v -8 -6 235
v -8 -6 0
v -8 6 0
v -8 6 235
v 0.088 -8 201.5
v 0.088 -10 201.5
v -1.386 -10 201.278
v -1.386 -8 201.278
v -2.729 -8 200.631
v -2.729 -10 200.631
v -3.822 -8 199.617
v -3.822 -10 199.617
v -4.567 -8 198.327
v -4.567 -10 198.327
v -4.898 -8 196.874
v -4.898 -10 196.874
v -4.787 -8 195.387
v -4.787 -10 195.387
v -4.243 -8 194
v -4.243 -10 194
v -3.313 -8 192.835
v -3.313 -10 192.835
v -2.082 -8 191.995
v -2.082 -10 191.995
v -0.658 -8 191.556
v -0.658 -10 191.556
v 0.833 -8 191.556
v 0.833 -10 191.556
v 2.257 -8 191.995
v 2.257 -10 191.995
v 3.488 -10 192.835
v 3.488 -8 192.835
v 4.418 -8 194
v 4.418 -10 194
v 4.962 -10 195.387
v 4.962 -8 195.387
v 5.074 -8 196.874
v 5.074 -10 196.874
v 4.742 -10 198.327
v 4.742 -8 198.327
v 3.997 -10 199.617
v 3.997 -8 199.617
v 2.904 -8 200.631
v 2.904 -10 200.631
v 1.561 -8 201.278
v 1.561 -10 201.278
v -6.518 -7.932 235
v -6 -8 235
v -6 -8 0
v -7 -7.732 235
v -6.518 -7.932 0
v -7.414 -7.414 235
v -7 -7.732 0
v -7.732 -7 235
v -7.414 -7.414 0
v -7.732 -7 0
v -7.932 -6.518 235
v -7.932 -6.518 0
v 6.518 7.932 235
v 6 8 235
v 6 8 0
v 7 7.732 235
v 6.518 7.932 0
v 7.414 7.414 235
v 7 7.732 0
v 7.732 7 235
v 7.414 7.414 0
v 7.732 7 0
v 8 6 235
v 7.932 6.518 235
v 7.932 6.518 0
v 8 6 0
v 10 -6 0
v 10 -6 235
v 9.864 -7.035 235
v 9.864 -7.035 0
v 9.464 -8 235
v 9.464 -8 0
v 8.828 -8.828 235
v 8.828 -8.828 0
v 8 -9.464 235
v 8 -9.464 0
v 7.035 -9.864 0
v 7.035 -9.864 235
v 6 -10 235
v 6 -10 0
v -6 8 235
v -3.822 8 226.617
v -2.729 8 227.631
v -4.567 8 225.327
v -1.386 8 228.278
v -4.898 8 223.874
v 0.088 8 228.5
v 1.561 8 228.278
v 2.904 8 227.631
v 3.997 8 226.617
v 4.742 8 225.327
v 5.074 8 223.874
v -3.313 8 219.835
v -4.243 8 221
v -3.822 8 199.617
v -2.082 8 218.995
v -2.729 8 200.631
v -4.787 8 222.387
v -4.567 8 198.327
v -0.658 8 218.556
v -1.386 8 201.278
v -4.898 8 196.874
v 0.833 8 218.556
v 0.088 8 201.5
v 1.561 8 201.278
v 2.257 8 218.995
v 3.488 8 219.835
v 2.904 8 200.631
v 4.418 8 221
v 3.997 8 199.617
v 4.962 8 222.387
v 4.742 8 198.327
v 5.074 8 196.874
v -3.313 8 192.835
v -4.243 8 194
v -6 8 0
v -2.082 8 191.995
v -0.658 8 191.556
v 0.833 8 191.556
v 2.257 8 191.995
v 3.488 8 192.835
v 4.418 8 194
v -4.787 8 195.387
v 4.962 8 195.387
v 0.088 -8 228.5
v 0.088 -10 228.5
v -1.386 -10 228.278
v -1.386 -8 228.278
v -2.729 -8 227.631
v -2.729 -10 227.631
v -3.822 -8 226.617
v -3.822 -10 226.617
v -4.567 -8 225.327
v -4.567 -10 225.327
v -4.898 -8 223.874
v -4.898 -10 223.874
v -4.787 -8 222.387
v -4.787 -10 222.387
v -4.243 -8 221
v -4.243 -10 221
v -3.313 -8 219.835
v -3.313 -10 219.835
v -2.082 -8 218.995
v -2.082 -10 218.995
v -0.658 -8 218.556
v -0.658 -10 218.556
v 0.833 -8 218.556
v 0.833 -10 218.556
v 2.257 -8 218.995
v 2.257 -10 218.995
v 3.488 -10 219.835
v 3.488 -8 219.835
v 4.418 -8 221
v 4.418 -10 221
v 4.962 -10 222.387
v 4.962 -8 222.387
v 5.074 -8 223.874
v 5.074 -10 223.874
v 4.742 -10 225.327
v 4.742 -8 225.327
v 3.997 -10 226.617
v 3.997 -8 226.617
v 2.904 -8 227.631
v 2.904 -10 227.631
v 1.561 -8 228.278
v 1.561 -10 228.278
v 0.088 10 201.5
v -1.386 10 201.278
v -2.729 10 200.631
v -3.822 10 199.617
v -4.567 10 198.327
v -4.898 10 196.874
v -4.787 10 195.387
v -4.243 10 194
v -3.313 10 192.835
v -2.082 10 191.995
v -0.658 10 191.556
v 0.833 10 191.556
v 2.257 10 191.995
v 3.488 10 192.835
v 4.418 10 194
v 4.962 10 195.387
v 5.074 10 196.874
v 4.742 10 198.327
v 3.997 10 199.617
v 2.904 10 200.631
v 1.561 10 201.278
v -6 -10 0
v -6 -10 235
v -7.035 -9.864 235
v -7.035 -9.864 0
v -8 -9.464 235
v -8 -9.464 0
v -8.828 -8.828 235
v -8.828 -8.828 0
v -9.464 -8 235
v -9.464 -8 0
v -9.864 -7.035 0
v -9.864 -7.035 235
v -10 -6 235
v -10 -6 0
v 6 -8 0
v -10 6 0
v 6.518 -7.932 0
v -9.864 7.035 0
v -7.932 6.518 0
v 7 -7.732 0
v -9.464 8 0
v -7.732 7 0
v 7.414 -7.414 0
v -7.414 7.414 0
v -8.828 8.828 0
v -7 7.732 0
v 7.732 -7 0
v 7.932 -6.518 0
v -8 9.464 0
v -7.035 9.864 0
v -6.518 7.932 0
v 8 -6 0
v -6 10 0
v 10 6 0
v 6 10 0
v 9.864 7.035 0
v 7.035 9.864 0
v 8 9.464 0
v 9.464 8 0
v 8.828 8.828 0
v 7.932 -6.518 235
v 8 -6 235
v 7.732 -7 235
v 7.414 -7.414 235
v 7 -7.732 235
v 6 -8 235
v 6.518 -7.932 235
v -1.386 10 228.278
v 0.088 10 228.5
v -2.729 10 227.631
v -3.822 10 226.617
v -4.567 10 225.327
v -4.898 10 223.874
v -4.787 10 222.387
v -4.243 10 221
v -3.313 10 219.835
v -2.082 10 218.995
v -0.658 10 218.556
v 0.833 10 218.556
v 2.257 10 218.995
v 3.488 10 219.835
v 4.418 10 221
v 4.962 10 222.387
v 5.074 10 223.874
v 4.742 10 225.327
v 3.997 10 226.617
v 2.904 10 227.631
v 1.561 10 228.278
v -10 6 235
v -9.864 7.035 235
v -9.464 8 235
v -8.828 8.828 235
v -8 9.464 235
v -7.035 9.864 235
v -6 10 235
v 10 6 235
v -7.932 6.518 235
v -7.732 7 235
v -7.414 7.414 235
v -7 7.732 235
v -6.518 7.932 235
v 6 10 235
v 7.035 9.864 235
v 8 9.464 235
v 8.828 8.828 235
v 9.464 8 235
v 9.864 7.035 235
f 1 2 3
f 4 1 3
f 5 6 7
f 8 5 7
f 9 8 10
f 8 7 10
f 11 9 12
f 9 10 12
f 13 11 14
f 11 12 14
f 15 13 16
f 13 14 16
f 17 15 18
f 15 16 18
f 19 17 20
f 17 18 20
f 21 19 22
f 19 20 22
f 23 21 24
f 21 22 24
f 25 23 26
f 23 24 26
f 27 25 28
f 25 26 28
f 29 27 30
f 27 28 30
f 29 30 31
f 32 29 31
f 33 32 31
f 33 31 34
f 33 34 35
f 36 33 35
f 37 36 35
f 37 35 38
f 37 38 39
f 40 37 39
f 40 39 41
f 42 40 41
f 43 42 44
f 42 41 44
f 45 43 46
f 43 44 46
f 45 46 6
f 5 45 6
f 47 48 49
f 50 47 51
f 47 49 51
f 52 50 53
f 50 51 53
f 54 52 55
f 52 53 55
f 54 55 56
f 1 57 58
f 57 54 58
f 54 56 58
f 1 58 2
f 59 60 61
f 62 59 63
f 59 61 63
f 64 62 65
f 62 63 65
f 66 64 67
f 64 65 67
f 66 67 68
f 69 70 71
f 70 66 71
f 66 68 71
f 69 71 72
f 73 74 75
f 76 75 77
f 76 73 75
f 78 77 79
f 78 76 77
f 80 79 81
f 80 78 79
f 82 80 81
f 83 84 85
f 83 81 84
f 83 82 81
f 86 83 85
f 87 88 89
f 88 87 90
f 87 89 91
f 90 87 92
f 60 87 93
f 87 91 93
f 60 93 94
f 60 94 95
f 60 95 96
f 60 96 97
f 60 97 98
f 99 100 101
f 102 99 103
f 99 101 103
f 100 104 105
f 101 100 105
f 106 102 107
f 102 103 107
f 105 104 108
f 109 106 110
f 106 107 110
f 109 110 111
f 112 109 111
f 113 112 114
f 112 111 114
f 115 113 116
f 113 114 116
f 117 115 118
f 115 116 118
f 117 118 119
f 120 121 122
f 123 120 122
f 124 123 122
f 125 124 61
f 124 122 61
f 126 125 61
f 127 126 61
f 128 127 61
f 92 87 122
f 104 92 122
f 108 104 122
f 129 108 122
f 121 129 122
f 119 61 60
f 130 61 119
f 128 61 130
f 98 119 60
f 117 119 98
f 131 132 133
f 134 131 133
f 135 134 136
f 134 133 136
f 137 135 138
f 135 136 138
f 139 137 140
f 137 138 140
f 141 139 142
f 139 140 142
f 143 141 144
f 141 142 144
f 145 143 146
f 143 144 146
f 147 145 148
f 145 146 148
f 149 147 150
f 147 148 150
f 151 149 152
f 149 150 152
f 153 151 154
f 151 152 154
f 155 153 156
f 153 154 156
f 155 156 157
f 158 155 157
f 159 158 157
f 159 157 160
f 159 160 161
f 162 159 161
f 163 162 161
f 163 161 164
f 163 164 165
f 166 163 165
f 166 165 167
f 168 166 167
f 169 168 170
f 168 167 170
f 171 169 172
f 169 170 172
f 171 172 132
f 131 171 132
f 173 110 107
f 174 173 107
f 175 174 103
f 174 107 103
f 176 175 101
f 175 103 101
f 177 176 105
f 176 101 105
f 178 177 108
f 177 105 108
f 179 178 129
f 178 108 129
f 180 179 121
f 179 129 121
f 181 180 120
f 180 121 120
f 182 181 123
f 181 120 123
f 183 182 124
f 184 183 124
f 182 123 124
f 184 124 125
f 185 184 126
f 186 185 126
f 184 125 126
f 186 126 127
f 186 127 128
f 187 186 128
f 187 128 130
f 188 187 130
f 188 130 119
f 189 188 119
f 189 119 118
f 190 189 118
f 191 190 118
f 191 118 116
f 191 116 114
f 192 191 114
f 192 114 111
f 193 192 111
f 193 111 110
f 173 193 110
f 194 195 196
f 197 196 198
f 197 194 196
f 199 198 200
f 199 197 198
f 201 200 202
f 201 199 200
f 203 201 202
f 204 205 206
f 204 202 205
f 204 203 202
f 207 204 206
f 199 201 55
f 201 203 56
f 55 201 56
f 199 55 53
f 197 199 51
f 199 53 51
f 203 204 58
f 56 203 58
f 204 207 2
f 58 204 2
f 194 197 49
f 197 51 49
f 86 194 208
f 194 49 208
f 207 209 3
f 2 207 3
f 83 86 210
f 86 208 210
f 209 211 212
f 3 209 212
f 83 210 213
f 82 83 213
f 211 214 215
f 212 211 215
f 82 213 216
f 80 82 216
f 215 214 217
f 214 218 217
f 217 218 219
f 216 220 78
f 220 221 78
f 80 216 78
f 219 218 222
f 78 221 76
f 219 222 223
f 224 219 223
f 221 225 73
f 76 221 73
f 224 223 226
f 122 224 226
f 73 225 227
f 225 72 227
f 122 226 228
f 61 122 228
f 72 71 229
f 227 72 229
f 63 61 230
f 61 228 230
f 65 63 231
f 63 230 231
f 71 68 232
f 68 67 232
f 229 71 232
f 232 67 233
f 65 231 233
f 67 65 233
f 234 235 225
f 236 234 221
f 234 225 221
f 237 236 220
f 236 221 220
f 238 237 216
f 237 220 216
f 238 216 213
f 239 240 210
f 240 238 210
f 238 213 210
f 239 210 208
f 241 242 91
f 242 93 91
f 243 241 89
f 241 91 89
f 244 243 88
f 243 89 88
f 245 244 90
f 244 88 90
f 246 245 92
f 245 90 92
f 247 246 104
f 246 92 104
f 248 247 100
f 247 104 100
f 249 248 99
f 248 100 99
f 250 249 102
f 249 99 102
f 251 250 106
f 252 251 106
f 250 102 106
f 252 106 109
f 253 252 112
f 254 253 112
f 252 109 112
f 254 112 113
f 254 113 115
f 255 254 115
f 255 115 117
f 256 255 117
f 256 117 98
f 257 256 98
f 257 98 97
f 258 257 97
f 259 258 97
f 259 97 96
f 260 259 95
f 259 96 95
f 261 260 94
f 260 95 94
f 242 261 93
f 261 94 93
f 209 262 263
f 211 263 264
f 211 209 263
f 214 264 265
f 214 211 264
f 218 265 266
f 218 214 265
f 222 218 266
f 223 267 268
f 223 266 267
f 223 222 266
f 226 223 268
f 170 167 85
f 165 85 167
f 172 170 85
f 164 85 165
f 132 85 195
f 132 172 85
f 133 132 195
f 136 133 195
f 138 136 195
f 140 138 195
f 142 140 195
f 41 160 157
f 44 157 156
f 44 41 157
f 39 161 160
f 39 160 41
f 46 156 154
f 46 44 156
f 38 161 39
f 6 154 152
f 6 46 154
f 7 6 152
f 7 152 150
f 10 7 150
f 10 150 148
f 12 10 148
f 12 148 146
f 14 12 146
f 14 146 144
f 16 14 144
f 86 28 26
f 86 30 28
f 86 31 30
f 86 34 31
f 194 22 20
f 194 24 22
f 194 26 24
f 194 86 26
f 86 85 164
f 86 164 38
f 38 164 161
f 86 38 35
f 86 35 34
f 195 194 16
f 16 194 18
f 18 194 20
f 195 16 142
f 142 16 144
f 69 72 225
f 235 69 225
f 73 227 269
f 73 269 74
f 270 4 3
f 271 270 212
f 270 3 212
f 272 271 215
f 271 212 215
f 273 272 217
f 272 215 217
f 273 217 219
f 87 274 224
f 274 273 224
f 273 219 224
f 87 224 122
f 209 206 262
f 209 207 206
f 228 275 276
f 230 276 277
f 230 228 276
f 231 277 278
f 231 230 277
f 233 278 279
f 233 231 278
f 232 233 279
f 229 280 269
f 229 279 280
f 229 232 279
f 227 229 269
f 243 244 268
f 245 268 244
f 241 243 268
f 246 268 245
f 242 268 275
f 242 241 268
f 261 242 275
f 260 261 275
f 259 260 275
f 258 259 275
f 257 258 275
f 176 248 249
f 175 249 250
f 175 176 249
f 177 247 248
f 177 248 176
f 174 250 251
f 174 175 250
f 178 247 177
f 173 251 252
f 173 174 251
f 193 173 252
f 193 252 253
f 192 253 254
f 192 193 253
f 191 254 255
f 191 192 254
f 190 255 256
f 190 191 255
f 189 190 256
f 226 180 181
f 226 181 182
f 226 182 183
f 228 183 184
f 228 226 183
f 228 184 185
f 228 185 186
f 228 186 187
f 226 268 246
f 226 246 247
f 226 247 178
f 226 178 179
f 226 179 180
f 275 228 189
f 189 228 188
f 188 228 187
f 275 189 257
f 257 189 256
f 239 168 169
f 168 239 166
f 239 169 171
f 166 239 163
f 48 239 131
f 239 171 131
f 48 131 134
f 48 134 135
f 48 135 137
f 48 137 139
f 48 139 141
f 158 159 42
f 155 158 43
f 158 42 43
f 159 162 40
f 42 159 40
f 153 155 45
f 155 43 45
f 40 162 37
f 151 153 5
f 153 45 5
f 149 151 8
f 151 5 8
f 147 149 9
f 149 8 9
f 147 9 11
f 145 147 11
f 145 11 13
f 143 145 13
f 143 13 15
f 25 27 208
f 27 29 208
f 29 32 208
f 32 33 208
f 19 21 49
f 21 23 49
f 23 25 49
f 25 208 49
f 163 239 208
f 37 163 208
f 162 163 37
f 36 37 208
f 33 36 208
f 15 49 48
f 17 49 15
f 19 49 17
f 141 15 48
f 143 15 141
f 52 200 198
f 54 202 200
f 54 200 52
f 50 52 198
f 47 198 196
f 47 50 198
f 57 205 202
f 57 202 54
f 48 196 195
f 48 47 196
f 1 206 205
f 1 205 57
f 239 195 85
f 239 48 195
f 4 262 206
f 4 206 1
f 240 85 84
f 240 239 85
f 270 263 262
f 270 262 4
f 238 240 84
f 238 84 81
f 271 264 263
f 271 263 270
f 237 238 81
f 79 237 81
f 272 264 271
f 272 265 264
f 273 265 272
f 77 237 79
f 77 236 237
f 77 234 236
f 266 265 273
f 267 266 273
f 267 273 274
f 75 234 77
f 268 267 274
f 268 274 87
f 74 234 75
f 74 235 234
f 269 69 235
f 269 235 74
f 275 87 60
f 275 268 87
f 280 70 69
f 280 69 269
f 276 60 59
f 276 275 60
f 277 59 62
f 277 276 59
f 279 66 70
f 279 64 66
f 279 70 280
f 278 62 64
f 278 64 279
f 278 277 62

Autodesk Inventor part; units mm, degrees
ref_plane "YZ Plane" through (0, 0, 0) normal (1, 0, 0) x (0, 1, 0)
ref_plane "Piano iniziale" through (0, 0, 0) normal (0, 0, 1) x (1, 0, 0)
ref_plane "Piano finale" through (0, 0, 235) normal (0, 0, 1) x (1, 0, 0)
sketch "Schizzo" plane through (0, 0, 0) normal (0, 0, 1) x (1, 0, 0)
  line L0 (-10, -6) -> (-10, 6)
  line L1 (-6, 10) -> (6, 10)
  line L2 (10, 6) -> (10, -6)
  line L3 (6, -10) -> (-6, -10)
  arc A0 (-10, -6) -> (-6, -10) centre (-6, -6) ccw
  arc A1 (10, 6) -> (6, 10) centre (6, 6) ccw
  arc A2 (-6, 10) -> (-10, 6) centre (-6, 6) ccw
  arc A3 (6, -10) -> (10, -6) centre (6, -6) ccw
  arc A4 (-6, 8) -> (-8, 6) centre (-6, 6) ccw
  line L4 (-6, 8) -> (6, 8)
  arc A5 (8, 6) -> (6, 8) centre (6, 6) ccw
  line L5 (8, 6) -> (8, -6)
  arc A6 (6, -8) -> (8, -6) centre (6, -6) ccw
  line L6 (6, -8) -> (-6, -8)
  arc A7 (-8, -6) -> (-6, -8) centre (-6, -6) ccw
  line L7 (-8, -6) -> (-8, 6)
  line L8 (0, 15.1598) -> (0, -15.1598) construction
  line L9 (-15.1598, 0) -> (15.1598, 0) construction
  dimension "d7" = 4
  dimension "d9" = 20
  dimension "d11" = 20
  dimension "d12" = 2
  dimension "d15" = 10
  dimension "d16" = 10
extrude "Corpo" add sketch "Schizzo" along normal up to surface (235 mm away) from surface at 0
sketch "Sketch3" plane through (0, 0, 0) normal (0, 0, 1) x (1, 0, 0)
  line L0 (0, 0) -> (10, 0)
ref_plane "Work Plane3" through (0, 0, 0) normal (0, -1, 0) x (1, 0, 0)
sketch "Sketch4" plane through (0, 0, 0) normal (0, -1, 0) x (1, 0, 0)
  line L0 (-2, 0) -> (12, 0)
  line L1 (-2, 235) -> (12, 235)
  dimension "d18" = 235
sketch "Schizzo5" plane through (6, 10, 235) normal (0, 1, 0) x (1, 0, 0)
  line L0 (-12, 0) -> (0, 0) projected
  line L1 (4, 235) -> (4, 0) projected
  point P0 (-6, 235)
  point P1 (-5.9124, 11.5)
  point P2 (-5.9124, 38.5)
  dimension "d26" = 11.5
  dimension "d27" = 27
  dimension "d28" = 9.9124
hole "Foro1" at (0.0876, 10, 223.5) at (0.0876, 10, 196.5) direction (0, -1, 0) diameter 10 end through all
equation "\"d7\" = G_IR"
equation "\"d9\" = G_W"
equation "\"d11\" = G_H"
equation "\"d12\" = G_T"
equation "\"d15\" = 0.5 * d9"
equation "\"d16\" = 0.5 * d11"
equation "\"d3\" = G_L"
equation "\"G_W\" = 20"
equation "\"G_H\" = 20"
equation "\"G_T\" = 2"
equation "\"G_IR\" = 4"
equation "\"G_L\" = d18"
equation "\"G_OFFSET_START\" = 0"
equation "\"G_OFFSET_END\" = 0"
equation "\"d14\" = G_OFFSET_END + B_L"
equation "\"B_L\" = 235"
properties part number "ISO 10799-2 - 20x20x2 - 235" material "Acciaio, Dolce"
